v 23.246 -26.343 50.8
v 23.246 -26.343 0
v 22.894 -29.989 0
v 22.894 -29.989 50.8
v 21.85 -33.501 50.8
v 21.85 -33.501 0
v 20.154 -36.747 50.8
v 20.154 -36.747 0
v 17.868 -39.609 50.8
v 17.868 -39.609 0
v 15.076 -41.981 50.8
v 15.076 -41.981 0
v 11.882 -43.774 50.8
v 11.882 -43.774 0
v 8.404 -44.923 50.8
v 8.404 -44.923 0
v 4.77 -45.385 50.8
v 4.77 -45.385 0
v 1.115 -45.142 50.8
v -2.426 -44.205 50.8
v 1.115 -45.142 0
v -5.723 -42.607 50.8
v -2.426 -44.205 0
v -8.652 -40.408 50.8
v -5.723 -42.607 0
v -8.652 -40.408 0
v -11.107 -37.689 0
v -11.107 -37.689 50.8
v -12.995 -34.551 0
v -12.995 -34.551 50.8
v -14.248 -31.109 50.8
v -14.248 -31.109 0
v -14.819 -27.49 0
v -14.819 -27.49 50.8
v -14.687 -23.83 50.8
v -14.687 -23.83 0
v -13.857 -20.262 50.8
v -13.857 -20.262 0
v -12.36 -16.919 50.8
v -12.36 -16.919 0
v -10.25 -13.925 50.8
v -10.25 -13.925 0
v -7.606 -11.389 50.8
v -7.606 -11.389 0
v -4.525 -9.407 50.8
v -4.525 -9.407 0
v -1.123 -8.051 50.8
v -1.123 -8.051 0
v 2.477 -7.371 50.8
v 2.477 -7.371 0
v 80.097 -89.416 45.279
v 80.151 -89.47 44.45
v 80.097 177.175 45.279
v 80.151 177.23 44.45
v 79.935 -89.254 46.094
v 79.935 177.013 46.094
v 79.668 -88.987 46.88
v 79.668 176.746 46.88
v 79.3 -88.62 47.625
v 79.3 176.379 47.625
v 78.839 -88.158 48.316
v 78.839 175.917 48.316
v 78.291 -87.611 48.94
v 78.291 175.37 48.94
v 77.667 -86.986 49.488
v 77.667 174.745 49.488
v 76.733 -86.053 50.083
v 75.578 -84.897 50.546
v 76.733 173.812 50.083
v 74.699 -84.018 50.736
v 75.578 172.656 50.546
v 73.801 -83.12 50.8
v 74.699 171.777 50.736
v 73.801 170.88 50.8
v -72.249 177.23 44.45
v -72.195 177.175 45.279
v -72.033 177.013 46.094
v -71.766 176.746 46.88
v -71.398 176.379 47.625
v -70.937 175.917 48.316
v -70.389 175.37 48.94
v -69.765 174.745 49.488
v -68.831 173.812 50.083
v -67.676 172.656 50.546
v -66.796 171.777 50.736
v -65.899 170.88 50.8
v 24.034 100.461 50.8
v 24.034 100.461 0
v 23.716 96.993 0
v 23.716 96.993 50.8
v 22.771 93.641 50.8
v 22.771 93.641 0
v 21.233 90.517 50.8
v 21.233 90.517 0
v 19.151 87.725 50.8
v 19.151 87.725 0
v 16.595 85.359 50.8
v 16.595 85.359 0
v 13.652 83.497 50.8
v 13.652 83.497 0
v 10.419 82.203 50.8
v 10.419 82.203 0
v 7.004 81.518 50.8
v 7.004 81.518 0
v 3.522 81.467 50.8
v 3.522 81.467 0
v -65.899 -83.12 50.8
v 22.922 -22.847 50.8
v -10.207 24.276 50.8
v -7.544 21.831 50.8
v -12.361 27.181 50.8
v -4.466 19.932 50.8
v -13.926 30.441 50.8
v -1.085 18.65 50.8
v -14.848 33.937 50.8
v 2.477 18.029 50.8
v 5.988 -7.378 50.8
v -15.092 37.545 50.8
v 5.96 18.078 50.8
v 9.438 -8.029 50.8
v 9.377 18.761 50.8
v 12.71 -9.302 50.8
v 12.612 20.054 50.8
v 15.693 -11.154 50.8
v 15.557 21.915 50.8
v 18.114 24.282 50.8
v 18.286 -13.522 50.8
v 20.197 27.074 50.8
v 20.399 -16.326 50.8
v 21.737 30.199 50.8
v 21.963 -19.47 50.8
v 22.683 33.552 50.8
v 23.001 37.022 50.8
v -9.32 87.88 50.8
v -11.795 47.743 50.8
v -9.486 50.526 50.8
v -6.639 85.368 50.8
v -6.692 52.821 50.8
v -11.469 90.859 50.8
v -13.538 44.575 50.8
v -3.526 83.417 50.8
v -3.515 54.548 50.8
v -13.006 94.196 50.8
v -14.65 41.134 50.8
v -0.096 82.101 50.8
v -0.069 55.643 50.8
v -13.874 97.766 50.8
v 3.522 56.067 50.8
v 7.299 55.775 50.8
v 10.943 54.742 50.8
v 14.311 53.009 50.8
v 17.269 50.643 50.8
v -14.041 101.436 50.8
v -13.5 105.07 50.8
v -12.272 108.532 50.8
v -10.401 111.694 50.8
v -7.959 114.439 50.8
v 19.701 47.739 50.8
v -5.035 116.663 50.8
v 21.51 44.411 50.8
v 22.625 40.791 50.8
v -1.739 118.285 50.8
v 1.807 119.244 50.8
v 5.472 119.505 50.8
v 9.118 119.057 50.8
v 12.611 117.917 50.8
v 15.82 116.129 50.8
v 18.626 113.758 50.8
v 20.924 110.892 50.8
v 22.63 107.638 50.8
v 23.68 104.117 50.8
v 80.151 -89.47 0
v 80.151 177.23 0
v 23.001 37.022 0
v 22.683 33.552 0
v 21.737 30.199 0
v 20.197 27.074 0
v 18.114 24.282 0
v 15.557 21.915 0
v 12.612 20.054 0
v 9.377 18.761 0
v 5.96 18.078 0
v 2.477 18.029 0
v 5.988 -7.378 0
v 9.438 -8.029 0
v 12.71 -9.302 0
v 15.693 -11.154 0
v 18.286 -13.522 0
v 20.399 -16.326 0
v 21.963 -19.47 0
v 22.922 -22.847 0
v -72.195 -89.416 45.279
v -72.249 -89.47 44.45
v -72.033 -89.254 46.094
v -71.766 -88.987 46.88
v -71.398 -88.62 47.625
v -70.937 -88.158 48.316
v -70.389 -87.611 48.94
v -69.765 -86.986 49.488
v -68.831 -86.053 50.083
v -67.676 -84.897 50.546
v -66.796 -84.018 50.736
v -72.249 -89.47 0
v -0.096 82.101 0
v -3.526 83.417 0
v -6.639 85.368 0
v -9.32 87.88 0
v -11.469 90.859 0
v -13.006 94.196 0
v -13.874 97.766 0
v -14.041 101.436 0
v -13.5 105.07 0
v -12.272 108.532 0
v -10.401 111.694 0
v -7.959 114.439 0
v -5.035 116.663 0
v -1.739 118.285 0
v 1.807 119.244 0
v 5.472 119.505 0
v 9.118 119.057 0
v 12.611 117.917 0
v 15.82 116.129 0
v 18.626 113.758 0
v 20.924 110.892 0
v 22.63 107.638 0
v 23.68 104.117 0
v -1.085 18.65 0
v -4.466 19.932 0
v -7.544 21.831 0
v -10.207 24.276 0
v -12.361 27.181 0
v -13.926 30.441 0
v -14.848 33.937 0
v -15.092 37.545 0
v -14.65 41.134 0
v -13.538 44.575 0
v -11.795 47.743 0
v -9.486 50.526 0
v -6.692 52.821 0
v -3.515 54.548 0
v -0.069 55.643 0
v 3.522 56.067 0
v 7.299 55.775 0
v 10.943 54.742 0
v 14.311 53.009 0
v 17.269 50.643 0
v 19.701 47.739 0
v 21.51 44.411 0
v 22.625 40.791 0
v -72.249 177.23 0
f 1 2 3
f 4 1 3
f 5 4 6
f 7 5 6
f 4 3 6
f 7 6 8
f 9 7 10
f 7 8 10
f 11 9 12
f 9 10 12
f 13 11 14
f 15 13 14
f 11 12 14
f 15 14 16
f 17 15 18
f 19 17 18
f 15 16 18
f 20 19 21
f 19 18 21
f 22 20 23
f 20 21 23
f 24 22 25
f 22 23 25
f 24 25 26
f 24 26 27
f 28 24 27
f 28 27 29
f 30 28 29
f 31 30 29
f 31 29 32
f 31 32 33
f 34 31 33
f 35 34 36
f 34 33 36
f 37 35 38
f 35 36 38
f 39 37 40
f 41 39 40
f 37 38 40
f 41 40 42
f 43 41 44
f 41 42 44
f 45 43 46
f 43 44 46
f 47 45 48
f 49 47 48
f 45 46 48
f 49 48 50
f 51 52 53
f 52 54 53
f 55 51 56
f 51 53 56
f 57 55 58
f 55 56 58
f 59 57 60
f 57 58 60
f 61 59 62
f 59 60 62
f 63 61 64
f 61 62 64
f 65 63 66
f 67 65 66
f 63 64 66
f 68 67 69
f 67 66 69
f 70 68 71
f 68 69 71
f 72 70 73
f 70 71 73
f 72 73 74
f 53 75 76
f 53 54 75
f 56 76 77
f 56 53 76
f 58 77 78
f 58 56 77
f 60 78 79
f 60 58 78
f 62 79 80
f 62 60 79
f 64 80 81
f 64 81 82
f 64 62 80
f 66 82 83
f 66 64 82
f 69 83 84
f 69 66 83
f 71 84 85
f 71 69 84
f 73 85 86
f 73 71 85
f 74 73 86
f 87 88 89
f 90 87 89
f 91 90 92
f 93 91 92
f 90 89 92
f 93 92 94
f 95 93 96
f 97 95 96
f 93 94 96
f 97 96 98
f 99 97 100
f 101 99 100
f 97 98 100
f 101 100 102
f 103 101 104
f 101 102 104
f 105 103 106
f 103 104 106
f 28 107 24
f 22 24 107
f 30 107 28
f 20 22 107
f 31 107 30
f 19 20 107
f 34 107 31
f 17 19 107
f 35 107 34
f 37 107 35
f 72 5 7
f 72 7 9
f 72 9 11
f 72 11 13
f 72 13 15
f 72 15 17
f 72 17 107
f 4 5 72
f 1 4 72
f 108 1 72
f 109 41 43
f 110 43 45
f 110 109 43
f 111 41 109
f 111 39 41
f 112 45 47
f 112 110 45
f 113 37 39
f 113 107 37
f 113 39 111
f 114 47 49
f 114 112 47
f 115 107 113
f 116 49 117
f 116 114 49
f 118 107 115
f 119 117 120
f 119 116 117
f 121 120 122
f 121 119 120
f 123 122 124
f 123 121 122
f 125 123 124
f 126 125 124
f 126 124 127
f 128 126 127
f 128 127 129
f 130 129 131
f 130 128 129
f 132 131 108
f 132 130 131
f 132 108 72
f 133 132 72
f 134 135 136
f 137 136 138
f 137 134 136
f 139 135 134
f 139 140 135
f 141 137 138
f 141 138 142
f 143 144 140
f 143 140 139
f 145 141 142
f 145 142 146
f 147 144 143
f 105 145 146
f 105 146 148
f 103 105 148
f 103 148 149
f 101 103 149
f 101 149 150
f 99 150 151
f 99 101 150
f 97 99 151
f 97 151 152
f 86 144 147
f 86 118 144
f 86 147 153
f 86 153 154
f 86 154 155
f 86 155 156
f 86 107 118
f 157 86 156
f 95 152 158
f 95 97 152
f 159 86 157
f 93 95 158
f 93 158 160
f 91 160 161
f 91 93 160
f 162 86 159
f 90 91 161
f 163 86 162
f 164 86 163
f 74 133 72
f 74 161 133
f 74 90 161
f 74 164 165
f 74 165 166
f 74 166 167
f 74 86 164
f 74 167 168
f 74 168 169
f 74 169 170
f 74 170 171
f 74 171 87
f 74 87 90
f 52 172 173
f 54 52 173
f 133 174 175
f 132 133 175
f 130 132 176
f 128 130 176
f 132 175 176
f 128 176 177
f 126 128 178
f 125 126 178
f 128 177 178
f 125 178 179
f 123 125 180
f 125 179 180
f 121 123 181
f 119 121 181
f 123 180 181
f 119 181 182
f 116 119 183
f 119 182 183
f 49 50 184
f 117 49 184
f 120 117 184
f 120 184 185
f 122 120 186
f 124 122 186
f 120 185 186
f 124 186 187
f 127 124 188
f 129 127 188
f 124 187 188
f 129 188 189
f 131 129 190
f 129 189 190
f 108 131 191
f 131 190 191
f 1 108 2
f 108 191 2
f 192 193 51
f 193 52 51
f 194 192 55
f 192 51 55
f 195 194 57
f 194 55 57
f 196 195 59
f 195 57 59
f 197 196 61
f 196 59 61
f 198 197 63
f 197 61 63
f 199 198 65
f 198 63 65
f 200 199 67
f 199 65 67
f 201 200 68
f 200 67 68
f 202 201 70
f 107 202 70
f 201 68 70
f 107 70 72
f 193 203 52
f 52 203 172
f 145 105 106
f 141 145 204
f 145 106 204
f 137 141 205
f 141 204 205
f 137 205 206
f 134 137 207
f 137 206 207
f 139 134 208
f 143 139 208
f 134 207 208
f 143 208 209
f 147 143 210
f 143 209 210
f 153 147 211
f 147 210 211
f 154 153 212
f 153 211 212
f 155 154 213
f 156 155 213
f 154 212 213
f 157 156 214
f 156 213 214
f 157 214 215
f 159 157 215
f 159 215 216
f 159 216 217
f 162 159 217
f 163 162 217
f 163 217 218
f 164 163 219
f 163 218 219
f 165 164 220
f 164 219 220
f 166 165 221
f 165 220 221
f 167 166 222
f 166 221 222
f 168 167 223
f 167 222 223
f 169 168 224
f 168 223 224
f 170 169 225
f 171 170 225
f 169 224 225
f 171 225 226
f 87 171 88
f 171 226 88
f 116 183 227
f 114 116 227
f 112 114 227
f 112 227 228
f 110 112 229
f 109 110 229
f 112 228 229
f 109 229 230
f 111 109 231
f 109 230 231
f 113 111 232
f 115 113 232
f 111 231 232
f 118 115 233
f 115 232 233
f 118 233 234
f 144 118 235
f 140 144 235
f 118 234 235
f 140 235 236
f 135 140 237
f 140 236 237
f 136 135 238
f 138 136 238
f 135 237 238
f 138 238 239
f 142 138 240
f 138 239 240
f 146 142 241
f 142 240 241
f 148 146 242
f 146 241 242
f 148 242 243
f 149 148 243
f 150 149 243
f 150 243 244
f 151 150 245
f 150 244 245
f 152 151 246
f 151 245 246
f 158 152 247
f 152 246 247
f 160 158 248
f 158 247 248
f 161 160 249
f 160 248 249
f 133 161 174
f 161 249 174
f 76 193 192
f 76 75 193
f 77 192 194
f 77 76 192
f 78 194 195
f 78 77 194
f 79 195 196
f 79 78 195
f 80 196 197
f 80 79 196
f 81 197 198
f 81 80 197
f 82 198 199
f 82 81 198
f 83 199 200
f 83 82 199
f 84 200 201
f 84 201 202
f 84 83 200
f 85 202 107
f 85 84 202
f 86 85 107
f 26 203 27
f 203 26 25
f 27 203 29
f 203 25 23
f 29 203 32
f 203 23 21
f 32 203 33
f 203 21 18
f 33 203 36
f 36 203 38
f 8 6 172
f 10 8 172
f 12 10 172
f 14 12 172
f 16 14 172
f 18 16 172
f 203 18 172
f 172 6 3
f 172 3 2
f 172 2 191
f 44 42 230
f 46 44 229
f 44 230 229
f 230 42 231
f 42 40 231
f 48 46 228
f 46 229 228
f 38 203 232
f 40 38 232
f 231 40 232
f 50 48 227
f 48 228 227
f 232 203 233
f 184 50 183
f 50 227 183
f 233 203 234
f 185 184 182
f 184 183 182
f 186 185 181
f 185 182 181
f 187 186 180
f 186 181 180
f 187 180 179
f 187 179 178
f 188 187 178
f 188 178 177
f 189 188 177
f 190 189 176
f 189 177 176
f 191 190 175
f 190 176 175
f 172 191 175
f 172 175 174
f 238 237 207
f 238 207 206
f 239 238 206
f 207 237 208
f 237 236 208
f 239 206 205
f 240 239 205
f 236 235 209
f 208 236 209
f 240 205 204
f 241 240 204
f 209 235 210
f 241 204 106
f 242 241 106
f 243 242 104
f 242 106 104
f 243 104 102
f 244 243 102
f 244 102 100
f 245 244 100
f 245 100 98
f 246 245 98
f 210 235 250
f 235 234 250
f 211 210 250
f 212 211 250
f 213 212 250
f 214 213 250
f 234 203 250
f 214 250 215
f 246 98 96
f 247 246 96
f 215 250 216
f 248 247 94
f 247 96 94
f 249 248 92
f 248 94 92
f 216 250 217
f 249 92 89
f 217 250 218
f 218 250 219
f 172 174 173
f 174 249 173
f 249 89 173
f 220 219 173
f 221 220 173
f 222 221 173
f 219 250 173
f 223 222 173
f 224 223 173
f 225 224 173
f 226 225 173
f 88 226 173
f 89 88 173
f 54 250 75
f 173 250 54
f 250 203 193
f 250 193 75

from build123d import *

# Parameters (mm, degrees)
F0_W     = 152.4
F0_H     = 266.7
F1_DEPTH = 50.8
F2_R     = 6.35


with BuildPart() as f1:
    # F0 (on Top) → F1 (new body)
    with BuildSketch(Plane.XY):
        with Locations((3.951112, 43.879506)):
            Rectangle(F0_W, F0_H)
        with BuildLine():
            ThreePointArc((23.245994, -26.343299), (-8.652188, -40.408388), (2.476784, -7.371035))
            ThreePointArc((2.476784, -7.371035), (17.044175, -12.27821), (23.245994, -26.343299))
        make_face(mode=Mode.SUBTRACT)
        with BuildLine():
            ThreePointArc((3.522208, 56.067), (17.268992, 50.643009), (23.001112, 37.021828))
            ThreePointArc((23.001112, 37.021828), (16.889747, 23.039903), (2.476784, 18.028965))
            ThreePointArc((2.476784, 18.028965), (-15.091698, 37.545195), (3.522208, 56.067))
        make_face(mode=Mode.SUBTRACT)
        with BuildLine():
            ThreePointArc((24.034084, 100.460825), (17.927302, 86.483142), (3.522208, 81.467))
            ThreePointArc((3.522208, 81.467), (-7.959133, 114.438508), (24.034084, 100.460825))
        make_face(mode=Mode.SUBTRACT)
    extrude(amount=F1_DEPTH)

    # F2
    f2_edges = [f1.edges().sort_by_distance(p)[0] for p in [
        (3.951112, -89.470494, 50.8),
        (80.151112, 43.879506, 50.8),
        (3.951112, 177.229506, 50.8),
        (-72.248888, 43.879506, 50.8),
    ]]
    fillet(f2_edges, radius=F2_R)


solid = f1.part
